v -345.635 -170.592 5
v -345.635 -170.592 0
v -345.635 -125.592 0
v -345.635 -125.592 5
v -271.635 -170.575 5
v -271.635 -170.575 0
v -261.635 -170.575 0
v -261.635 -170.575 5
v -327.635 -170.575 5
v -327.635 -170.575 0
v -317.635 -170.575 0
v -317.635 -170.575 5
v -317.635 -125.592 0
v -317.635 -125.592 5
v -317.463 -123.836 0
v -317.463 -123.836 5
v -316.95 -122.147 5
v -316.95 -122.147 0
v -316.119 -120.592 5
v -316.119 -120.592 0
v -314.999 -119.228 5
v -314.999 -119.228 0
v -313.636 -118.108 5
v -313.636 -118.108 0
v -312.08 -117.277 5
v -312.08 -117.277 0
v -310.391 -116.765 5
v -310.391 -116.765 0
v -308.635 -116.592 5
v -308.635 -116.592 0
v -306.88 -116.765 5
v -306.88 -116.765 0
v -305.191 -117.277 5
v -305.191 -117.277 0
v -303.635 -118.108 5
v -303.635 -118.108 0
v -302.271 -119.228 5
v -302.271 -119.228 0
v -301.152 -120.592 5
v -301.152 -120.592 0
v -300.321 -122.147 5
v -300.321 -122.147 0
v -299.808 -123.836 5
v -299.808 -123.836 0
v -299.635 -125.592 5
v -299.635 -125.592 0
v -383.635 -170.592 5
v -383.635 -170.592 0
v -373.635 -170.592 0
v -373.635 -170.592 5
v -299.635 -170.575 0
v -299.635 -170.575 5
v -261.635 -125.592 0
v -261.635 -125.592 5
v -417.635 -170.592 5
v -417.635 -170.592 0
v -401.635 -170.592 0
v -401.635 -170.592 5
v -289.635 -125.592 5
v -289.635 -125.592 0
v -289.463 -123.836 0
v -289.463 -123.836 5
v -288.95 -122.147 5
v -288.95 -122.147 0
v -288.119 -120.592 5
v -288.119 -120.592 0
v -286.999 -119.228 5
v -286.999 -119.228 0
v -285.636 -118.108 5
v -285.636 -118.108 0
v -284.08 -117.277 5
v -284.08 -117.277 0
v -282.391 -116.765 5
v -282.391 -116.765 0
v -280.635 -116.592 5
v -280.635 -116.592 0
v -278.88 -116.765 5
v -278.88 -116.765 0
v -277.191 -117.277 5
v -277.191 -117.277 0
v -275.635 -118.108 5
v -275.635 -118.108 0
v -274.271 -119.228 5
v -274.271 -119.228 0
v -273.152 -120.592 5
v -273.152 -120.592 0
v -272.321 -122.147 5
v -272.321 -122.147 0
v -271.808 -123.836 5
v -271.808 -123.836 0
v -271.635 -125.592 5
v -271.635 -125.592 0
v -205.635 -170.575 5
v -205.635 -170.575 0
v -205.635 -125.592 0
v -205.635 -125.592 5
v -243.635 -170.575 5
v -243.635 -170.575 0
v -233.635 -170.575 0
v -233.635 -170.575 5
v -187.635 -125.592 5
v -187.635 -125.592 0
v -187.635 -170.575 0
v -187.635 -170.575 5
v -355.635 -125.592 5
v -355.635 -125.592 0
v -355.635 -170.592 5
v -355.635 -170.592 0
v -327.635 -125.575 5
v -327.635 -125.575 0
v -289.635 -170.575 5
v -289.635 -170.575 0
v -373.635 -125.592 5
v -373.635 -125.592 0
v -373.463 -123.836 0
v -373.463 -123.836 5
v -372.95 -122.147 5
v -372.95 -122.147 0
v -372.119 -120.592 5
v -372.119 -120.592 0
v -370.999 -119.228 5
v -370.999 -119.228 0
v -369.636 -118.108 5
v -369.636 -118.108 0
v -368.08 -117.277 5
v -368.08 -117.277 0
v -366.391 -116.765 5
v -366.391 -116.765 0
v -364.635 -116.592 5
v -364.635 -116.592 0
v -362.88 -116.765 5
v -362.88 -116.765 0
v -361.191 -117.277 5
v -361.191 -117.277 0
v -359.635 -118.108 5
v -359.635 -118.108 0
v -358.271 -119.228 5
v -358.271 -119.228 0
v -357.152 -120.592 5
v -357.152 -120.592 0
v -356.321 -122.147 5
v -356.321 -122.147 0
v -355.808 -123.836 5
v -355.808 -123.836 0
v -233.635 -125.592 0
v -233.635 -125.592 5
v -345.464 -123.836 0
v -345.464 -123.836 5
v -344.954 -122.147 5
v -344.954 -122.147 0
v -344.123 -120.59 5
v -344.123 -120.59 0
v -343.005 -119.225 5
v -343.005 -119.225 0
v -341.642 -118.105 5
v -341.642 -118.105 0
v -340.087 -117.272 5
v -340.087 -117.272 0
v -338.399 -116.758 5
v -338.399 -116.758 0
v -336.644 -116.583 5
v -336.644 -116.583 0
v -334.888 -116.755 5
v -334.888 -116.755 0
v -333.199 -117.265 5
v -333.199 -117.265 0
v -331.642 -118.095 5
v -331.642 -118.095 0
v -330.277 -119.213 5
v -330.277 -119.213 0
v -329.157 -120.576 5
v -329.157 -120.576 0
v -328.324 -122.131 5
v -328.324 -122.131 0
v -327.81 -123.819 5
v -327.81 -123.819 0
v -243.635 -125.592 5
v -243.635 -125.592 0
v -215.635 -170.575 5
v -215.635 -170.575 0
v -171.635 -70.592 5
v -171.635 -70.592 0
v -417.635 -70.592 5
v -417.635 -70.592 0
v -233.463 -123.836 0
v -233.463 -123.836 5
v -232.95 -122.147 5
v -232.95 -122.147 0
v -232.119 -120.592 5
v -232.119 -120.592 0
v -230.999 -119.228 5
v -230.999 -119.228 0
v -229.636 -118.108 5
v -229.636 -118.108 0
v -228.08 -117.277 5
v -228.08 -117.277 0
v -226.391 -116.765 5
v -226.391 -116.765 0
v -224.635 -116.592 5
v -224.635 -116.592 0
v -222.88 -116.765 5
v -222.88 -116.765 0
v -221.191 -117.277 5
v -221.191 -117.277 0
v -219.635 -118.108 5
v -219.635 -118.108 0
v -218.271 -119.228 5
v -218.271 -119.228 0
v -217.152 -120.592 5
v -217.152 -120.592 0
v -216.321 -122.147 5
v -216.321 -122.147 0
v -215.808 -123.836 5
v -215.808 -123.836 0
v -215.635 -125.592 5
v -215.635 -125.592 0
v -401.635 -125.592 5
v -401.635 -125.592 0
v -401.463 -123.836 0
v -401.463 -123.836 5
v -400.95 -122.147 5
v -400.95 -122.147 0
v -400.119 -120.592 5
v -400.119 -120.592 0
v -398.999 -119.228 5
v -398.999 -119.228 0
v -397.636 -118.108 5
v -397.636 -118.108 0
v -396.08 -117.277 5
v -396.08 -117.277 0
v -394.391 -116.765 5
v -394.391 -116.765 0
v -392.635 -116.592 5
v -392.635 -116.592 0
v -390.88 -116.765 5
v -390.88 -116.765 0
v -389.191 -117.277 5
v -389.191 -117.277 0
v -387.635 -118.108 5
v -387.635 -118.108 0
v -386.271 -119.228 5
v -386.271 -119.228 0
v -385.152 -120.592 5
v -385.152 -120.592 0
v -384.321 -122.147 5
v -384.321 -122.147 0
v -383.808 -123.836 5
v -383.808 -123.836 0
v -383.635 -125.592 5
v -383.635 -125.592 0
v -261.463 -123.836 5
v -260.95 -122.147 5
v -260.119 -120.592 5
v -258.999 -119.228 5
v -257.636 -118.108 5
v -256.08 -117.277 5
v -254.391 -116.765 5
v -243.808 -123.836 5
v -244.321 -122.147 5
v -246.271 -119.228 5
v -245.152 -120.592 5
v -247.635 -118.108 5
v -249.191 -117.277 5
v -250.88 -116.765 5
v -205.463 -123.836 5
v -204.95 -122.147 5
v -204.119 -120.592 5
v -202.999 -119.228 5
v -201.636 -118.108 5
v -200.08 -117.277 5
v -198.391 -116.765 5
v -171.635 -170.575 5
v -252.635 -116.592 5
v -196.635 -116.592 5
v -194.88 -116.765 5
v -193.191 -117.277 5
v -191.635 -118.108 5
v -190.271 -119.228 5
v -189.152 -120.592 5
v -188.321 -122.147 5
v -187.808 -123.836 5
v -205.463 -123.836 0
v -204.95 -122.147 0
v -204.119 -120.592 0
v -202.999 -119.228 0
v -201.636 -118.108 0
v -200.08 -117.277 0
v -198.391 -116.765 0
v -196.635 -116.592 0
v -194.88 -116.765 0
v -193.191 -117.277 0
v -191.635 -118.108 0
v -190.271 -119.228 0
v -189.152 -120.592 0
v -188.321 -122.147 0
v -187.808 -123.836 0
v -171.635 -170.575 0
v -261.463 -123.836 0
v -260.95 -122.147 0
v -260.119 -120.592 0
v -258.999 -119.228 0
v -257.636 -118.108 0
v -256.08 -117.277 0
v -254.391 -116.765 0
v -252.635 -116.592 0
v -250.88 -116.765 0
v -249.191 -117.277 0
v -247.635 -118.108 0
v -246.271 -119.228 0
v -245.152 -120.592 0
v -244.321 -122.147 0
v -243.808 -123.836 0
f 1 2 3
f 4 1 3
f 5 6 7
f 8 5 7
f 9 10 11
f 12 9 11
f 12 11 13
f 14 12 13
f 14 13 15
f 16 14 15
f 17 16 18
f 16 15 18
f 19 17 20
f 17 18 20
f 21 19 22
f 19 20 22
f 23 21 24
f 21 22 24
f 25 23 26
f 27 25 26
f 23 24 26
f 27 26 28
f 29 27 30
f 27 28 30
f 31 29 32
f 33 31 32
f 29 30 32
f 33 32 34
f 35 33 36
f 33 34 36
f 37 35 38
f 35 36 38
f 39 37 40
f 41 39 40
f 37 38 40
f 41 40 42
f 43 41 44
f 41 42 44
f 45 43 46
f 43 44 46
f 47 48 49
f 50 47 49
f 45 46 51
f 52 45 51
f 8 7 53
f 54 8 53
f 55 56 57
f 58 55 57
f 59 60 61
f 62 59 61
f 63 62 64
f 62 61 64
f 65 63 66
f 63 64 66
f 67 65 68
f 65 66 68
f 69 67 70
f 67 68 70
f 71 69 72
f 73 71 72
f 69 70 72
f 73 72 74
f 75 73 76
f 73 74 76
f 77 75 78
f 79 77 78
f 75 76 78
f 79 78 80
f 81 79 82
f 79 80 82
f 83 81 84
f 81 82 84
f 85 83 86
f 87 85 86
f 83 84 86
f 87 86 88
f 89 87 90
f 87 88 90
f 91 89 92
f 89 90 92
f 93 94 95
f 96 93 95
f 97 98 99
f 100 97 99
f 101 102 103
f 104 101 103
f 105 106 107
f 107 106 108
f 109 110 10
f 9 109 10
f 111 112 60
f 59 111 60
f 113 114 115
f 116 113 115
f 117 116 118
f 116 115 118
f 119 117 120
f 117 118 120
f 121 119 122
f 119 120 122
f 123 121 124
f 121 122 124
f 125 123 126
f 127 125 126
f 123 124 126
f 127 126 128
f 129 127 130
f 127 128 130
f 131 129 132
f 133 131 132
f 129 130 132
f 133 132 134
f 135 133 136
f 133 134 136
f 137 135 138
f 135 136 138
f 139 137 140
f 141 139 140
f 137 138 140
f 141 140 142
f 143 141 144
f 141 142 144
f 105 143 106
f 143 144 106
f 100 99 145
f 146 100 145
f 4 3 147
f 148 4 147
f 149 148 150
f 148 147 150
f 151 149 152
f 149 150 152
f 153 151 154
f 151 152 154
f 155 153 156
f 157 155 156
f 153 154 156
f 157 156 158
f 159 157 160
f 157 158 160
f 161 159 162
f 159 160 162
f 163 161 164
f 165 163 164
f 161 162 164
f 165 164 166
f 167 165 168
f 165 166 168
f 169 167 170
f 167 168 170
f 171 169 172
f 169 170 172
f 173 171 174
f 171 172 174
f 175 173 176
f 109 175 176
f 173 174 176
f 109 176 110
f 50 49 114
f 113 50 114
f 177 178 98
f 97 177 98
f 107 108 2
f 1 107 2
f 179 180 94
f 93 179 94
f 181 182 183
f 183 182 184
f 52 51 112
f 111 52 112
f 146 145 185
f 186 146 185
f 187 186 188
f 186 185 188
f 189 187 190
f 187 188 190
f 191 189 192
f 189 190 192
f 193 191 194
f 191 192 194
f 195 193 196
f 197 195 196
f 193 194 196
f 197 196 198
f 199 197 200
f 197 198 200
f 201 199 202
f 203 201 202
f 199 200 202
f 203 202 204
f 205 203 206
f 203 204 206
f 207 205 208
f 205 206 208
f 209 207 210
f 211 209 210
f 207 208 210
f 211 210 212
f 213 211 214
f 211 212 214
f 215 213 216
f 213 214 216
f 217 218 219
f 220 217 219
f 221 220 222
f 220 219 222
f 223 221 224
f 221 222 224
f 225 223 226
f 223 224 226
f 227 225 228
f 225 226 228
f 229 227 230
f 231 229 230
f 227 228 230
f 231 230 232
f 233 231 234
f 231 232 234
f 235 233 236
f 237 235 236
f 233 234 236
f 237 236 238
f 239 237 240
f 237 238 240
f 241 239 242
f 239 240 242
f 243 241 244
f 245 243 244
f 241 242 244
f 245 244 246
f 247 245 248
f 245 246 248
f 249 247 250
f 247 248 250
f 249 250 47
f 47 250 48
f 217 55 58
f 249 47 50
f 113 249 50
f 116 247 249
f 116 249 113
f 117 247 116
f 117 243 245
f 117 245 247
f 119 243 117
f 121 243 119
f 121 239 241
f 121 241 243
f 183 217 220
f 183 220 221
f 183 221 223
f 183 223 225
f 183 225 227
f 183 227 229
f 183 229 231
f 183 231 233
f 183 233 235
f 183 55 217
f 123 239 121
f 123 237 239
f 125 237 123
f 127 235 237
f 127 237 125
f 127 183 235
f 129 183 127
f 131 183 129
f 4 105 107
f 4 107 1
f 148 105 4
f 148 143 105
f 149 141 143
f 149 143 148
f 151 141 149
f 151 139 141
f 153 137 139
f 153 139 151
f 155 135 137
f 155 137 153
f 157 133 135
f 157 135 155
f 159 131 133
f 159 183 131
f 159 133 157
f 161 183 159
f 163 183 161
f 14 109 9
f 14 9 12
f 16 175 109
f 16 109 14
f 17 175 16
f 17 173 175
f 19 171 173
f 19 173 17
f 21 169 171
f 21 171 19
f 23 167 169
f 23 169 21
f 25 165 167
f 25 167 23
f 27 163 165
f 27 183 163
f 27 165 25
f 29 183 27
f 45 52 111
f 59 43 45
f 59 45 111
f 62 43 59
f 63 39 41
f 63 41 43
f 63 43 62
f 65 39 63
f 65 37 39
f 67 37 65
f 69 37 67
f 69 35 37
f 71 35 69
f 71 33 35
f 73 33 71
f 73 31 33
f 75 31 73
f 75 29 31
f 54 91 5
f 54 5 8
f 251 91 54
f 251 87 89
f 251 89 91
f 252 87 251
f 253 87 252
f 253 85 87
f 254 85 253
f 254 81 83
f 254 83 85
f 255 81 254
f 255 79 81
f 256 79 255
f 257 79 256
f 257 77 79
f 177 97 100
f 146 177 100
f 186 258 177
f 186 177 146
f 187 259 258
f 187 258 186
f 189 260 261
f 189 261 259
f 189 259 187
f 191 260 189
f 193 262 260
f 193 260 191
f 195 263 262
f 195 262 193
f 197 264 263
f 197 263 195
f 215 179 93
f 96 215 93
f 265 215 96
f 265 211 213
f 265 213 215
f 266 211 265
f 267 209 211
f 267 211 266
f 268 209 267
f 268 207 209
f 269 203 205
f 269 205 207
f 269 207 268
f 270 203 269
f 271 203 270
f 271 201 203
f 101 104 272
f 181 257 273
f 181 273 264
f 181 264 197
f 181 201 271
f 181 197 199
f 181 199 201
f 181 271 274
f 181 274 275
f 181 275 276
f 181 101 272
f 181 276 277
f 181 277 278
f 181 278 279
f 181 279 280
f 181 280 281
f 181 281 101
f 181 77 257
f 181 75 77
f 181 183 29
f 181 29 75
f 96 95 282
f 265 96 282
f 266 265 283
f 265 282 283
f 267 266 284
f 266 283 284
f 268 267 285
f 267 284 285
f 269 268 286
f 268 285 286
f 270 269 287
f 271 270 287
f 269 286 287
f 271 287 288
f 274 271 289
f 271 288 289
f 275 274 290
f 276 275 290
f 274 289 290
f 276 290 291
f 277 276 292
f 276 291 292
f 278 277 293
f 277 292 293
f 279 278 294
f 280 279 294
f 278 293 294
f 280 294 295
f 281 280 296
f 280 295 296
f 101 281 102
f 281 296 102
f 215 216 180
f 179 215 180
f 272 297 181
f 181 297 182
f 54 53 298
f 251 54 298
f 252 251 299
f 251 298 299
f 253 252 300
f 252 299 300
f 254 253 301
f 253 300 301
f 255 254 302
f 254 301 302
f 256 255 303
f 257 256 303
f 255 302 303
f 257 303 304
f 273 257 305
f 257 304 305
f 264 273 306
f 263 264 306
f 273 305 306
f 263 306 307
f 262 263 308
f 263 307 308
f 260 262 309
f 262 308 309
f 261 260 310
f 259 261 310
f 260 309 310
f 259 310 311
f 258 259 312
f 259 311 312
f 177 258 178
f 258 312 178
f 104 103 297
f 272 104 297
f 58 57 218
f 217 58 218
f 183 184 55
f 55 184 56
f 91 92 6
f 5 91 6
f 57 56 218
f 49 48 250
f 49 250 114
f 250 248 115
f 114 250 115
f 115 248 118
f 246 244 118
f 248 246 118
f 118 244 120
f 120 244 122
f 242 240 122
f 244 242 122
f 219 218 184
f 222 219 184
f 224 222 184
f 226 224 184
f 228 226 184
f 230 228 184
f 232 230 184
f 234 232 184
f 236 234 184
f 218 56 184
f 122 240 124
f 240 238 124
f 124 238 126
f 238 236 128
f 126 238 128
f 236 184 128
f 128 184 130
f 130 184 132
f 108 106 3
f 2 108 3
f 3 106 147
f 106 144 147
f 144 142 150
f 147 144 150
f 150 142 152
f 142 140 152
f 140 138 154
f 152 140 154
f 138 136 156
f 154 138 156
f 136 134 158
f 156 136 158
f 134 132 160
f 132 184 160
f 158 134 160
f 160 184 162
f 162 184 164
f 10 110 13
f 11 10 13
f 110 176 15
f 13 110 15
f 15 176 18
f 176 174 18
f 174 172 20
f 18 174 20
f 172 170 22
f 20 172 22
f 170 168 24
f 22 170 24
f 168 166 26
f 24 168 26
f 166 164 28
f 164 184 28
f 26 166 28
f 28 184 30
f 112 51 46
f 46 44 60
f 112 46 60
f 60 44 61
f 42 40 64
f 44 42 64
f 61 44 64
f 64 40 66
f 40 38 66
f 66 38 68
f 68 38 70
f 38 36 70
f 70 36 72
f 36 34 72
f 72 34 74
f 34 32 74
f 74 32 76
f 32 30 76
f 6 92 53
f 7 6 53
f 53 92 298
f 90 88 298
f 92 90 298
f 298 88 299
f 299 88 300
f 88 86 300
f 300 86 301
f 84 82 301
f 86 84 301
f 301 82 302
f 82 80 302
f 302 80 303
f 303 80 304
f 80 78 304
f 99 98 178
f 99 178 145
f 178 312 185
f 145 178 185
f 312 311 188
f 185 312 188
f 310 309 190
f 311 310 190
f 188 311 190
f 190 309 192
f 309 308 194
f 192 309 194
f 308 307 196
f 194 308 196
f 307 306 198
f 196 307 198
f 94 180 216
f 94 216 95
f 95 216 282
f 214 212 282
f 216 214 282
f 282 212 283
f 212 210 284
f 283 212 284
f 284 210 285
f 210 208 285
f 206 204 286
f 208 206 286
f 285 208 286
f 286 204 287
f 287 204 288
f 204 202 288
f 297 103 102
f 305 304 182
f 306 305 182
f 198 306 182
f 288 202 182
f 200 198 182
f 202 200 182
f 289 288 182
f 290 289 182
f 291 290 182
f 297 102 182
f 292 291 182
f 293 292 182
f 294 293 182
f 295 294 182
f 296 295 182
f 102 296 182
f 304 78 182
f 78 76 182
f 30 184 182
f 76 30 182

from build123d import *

# Parameters (mm, degrees)
F1_DEPTH = 5


with BuildPart() as f1:
    # F0 (on Top) → F1 (new body)
    with BuildSketch(Plane.XY):
        with BuildLine():
            Line((-171.635448, -70.591642), (-417.635441, -70.591642))
            Line((-417.635441, -70.591642), (-417.635441, -170.591642))
            Line((-417.635441, -170.591642), (-401.635441, -170.591642))
            Line((-401.635441, -170.591642), (-401.635441, -125.591642))
            ThreePointArc((-401.635441, -125.591642), (-392.635441, -116.591642), (-383.635441, -125.591642))
            Line((-383.635441, -125.591642), (-383.635441, -170.591642))
            Line((-383.635441, -170.591642), (-373.635441, -170.591642))
            Line((-373.635441, -170.591642), (-373.635441, -125.591642))
            ThreePointArc((-373.635441, -125.591642), (-364.635441, -116.591642), (-355.635441, -125.591642))
            Line((-355.635441, -125.591642), (-355.635441, -130.575008))
            Line((-355.635441, -130.575008), (-355.635441, -170.591642))
            Line((-355.635441, -170.591642), (-345.635441, -170.591642))
            Line((-345.635441, -170.591642), (-345.635441, -125.591642))
            ThreePointArc((-345.635441, -125.591642), (-336.643762, -116.583329), (-327.635448, -125.575008))
            Line((-327.635448, -125.575008), (-327.635448, -170.575008))
            Line((-327.635448, -170.575008), (-317.635448, -170.575008))
            Line((-317.635448, -170.575008), (-317.635448, -125.591642))
            ThreePointArc((-317.635448, -125.591642), (-308.635448, -116.591642), (-299.635448, -125.591642))
            Line((-299.635448, -125.591642), (-299.635448, -170.575008))
            Line((-299.635448, -170.575008), (-289.635448, -170.575008))
            Line((-289.635448, -170.575008), (-289.635448, -125.591642))
            ThreePointArc((-289.635448, -125.591642), (-280.635448, -116.591642), (-271.635448, -125.591642))
            Line((-271.635448, -125.591642), (-271.635448, -170.575008))
            Line((-271.635448, -170.575008), (-261.635448, -170.575008))
            Line((-261.635448, -170.575008), (-261.635448, -125.591642))
            ThreePointArc((-261.635448, -125.591642), (-252.635448, -116.591642), (-243.635448, -125.591642))
            Line((-243.635448, -125.591642), (-243.635448, -170.575008))
            Line((-243.635448, -170.575008), (-233.635448, -170.575008))
            Line((-233.635448, -170.575008), (-233.635448, -125.591642))
            ThreePointArc((-233.635448, -125.591642), (-224.635448, -116.591642), (-215.635448, -125.591642))
            Line((-215.635448, -125.591642), (-215.635448, -170.575008))
            Line((-215.635448, -170.575008), (-205.635448, -170.575008))
            Line((-205.635448, -170.575008), (-205.635448, -125.591642))
            ThreePointArc((-205.635448, -125.591642), (-196.635448, -116.591642), (-187.635448, -125.591642))
            Line((-187.635448, -125.591642), (-187.635448, -170.575008))
            Line((-187.635448, -170.575008), (-171.635448, -170.575008))
            Line((-171.635448, -170.575008), (-171.635448, -70.591642))
        make_face()
    extrude(amount=F1_DEPTH)


solid = f1.part
